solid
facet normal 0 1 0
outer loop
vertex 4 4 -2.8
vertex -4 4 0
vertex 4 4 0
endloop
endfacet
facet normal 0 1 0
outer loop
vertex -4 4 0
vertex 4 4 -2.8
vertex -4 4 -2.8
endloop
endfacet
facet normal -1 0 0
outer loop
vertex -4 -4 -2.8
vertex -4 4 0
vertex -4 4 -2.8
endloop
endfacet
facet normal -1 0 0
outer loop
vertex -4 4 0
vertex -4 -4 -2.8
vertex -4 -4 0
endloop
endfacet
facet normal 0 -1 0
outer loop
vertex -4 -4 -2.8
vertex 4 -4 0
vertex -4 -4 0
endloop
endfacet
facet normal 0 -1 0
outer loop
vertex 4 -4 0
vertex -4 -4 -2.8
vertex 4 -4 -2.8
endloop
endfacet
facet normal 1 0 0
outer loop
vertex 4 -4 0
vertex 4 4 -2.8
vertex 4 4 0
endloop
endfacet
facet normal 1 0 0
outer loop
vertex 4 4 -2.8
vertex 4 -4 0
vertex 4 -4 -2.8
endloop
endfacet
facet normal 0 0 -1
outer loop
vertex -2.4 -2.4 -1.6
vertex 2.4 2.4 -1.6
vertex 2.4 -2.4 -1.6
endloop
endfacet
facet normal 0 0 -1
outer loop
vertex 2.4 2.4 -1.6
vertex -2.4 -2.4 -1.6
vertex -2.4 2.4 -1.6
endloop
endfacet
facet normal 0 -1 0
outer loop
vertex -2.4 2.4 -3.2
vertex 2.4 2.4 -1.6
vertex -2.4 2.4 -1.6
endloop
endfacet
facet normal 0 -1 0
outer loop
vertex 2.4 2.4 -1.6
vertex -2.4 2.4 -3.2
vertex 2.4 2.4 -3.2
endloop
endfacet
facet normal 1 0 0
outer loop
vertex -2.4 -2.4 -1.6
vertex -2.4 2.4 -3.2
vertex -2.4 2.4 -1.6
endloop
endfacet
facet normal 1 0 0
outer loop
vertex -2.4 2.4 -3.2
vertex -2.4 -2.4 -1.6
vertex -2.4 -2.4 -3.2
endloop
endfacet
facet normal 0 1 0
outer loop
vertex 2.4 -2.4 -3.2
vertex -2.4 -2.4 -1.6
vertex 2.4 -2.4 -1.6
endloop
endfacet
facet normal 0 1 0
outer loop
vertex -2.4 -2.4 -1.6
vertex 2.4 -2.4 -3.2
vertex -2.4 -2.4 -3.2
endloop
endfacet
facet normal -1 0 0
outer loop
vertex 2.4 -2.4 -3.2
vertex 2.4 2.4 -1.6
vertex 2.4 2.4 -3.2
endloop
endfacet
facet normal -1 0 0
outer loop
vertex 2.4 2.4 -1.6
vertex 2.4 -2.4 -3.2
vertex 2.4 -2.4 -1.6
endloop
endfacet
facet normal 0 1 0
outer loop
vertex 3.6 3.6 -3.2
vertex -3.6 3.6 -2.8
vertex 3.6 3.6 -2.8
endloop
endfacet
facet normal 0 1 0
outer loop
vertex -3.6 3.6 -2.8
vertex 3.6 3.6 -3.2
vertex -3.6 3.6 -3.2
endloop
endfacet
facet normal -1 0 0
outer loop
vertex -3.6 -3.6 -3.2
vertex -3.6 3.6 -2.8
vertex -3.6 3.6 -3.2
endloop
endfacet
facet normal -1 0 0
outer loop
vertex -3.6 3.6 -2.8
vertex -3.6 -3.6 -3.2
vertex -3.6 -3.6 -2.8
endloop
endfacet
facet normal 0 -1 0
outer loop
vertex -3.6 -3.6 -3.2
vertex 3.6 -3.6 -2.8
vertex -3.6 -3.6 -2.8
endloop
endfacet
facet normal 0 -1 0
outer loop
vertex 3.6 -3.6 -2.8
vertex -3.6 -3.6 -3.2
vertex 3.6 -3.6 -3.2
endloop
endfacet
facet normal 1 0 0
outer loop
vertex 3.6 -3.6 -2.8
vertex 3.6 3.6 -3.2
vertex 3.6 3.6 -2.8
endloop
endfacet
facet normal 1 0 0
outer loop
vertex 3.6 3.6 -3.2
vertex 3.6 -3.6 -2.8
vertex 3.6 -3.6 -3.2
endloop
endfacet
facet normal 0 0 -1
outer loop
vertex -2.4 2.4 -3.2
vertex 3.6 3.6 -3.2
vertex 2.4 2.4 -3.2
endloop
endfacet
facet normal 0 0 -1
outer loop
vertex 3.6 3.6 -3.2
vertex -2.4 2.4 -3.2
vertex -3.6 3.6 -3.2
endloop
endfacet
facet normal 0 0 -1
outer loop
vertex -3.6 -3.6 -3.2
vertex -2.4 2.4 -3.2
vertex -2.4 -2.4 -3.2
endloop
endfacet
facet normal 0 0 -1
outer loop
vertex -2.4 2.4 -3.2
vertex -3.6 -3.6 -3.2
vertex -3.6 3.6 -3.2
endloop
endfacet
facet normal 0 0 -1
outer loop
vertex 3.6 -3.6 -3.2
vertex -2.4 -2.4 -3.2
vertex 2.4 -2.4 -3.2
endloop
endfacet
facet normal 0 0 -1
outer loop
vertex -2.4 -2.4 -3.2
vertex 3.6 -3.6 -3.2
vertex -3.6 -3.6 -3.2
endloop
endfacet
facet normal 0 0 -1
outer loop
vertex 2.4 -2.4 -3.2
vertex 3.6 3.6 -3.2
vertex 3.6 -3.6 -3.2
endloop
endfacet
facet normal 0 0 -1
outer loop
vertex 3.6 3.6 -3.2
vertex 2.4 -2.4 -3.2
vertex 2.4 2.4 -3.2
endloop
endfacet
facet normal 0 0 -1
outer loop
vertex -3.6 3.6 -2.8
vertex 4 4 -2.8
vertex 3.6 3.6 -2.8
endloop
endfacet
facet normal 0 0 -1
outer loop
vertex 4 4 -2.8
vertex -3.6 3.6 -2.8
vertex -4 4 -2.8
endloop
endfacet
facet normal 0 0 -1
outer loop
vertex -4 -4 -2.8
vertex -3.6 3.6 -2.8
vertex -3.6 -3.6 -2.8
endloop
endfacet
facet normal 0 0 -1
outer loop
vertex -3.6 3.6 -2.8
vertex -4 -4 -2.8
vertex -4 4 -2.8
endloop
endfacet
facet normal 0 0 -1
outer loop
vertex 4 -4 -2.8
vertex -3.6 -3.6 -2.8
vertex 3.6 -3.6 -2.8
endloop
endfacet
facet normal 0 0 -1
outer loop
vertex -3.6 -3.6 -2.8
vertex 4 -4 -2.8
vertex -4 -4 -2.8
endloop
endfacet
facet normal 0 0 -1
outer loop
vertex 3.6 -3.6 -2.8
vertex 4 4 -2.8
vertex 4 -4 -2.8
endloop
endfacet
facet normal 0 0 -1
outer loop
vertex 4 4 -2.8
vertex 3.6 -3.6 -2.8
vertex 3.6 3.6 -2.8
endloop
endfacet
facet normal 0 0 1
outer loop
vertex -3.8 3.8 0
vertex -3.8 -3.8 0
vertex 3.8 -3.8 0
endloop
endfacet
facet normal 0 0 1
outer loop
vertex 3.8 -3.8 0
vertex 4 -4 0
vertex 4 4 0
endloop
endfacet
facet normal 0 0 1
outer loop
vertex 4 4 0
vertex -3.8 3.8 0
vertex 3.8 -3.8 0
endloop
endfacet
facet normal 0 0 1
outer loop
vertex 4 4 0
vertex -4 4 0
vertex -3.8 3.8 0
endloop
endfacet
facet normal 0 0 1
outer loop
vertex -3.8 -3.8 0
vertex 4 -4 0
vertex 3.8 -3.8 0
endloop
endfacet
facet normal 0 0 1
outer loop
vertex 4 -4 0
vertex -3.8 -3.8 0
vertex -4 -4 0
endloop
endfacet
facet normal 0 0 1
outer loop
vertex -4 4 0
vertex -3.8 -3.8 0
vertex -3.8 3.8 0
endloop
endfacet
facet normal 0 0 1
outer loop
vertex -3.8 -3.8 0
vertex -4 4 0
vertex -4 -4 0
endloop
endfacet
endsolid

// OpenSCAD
// file: ../p/box5.scad
use <../lib.scad>
function ldraw_lib__box5() = [
// 0 Box with 5 Faces and All Edges
// 0 Name: box5.dat
// 0 Author: James Jessiman
// 0 !LDRAW_ORG Primitive UPDATE 2012-01
// 0 !LICENSE Licensed under CC BY 4.0 : see CAreadme.txt
// 
// 0 BFC CERTIFY CCW
  [0,"BFC","CERTIFY"],
  [0,"BFC","CCW"],
// 
// 0 !HISTORY 2002-04-03 [sbliss] Modified for BFC compliance
// 0 !HISTORY 2002-04-25 [PTadmin] Official Update 2002-02
// 0 !HISTORY 2007-06-24 [PTadmin] Header formatted for Contributor Agreement
// 0 !HISTORY 2008-07-01 [PTadmin] Official Update 2008-01
// 0 !HISTORY 2012-02-16 [Philo] Changed to CCW
// 0 !HISTORY 2012-03-30 [PTadmin] Official Update 2012-01
// 
// 
// 2 24 1 1 1 -1 1 1
  [2,24,1,1,1,-1,1,1],
// 2 24 -1 1 1 -1 1 -1
  [2,24,-1,1,1,-1,1,-1],
// 2 24 -1 1 -1 1 1 -1
  [2,24,-1,1,-1,1,1,-1],
// 2 24 1 1 -1 1 1 1
  [2,24,1,1,-1,1,1,1],
// 2 24 1 0 1 -1 0 1
  [2,24,1,0,1,-1,0,1],
// 2 24 -1 0 1 -1 0 -1
  [2,24,-1,0,1,-1,0,-1],
// 2 24 -1 0 -1 1 0 -1
  [2,24,-1,0,-1,1,0,-1],
// 2 24 1 0 -1 1 0 1
  [2,24,1,0,-1,1,0,1],
// 2 24 1 0 1 1 1 1
  [2,24,1,0,1,1,1,1],
// 2 24 -1 0 1 -1 1 1
  [2,24,-1,0,1,-1,1,1],
// 2 24 1 0 -1 1 1 -1
  [2,24,1,0,-1,1,1,-1],
// 2 24 -1 0 -1 -1 1 -1
  [2,24,-1,0,-1,-1,1,-1],
// 4 16 -1 1 1 1 1 1 1 1 -1 -1 1 -1
  [4,16,-1,1,1,1,1,1,1,1,-1,-1,1,-1],
// 4 16 -1 1 1 -1 0 1 1 0 1 1 1 1
  [4,16,-1,1,1,-1,0,1,1,0,1,1,1,1],
// 4 16 -1 1 -1 -1 0 -1 -1 0 1 -1 1 1
  [4,16,-1,1,-1,-1,0,-1,-1,0,1,-1,1,1],
// 4 16 1 1 -1 1 0 -1 -1 0 -1 -1 1 -1
  [4,16,1,1,-1,1,0,-1,-1,0,-1,-1,1,-1],
// 4 16 1 1 1 1 0 1 1 0 -1 1 1 -1
  [4,16,1,1,1,1,0,1,1,0,-1,1,1,-1],
];
module ldraw_lib__box5(step=0, col=false, unit=2/5, alt=false, line=0.2, solid=!$preview)
    makepoly(ldraw_lib__box5(), step=step, col=col, unit=unit, alt=alt, line=line, solid=solid);
ldraw_lib__box5(line=0.2);
// file: ../p/box4.scad
use <../lib.scad>
function ldraw_lib__box4() = [
// 0 Box with 4 Faces (2 Parallel Pairs) and All Edges
// 0 Name: box4.dat
// 0 Author: James Jessiman
// 0 !LDRAW_ORG Primitive UPDATE 2012-01
// 0 !LICENSE Licensed under CC BY 4.0 : see CAreadme.txt
// 
// 0 BFC CERTIFY CCW
  [0,"BFC","CERTIFY"],
  [0,"BFC","CCW"],
// 
// 0 !HISTORY 2002-04-03 [sbliss] Modified for BFC compliance
// 0 !HISTORY 2002-04-25 [PTadmin] Official Update 2002-02
// 0 !HISTORY 2007-06-24 [PTadmin] Header formatted for Contributor Agreement
// 0 !HISTORY 2008-07-01 [PTadmin] Official Update 2008-01
// 0 !HISTORY 2012-02-16 [Philo] Changed to CCW
// 0 !HISTORY 2012-03-30 [PTadmin] Official Update 2012-01
// 
// 
// 2 24 1 1 1 -1 1 1
  [2,24,1,1,1,-1,1,1],
// 2 24 -1 1 1 -1 1 -1
  [2,24,-1,1,1,-1,1,-1],
// 2 24 -1 1 -1 1 1 -1
  [2,24,-1,1,-1,1,1,-1],
// 2 24 1 1 -1 1 1 1
  [2,24,1,1,-1,1,1,1],
// 2 24 1 0 1 -1 0 1
  [2,24,1,0,1,-1,0,1],
// 2 24 -1 0 1 -1 0 -1
  [2,24,-1,0,1,-1,0,-1],
// 2 24 -1 0 -1 1 0 -1
  [2,24,-1,0,-1,1,0,-1],
// 2 24 1 0 -1 1 0 1
  [2,24,1,0,-1,1,0,1],
// 2 24 1 0 1 1 1 1
  [2,24,1,0,1,1,1,1],
// 2 24 -1 0 1 -1 1 1
  [2,24,-1,0,1,-1,1,1],
// 2 24 1 0 -1 1 1 -1
  [2,24,1,0,-1,1,1,-1],
// 2 24 -1 0 -1 -1 1 -1
  [2,24,-1,0,-1,-1,1,-1],
// 4 16 -1 1 1 -1 0 1 1 0 1 1 1 1
  [4,16,-1,1,1,-1,0,1,1,0,1,1,1,1],
// 4 16 -1 1 -1 -1 0 -1 -1 0 1 -1 1 1
  [4,16,-1,1,-1,-1,0,-1,-1,0,1,-1,1,1],
// 4 16 1 1 -1 1 0 -1 -1 0 -1 -1 1 -1
  [4,16,1,1,-1,1,0,-1,-1,0,-1,-1,1,-1],
// 4 16 1 1 1 1 0 1 1 0 -1 1 1 -1
  [4,16,1,1,1,1,0,1,1,0,-1,1,1,-1],
];
module ldraw_lib__box4(step=0, col=false, unit=2/5, alt=false, line=0.2, solid=!$preview)
    makepoly(ldraw_lib__box4(), step=step, col=col, unit=unit, alt=alt, line=line, solid=solid);
ldraw_lib__box4(line=0.2);
// file: s/3070bs01.scad
use <../../lib.scad>
use <../../p/box4.scad>
use <../../p/box5.scad>
function ldraw_lib__s__3070bs01() = [
// 0 ~Tile  1 x  1 with Groove without Top Face
// 0 Name: s\3070bs01.dat
// 0 Author: Chris Dee [cwdee]
// 0 !LDRAW_ORG Subpart UPDATE 2009-02
// 0 !LICENSE Licensed under CC BY 4.0 : see CAreadme.txt
// 
// 0 BFC CERTIFY CCW
  [0,"BFC","CERTIFY"],
  [0,"BFC","CCW"],
// 
// 0 !HISTORY 2009-09-03 [PTadmin] Official Update 2009-02
// 
// 
// 1 16 0 0 0 10 0 0 0 7 0 0 0 10 box4.dat
  [1,16,0,0,0,10,0,0,0,7,0,0,0,10, ldraw_lib__box4()],
// 0 BFC INVERTNEXT
  [0,"BFC","INVERTNEXT"],
// 1 16 0 8 0 6 0 0 0 -4 0 0 0 6 box5.dat
  [1,16,0,8,0,6,0,0,0,-4,0,0,0,6, ldraw_lib__box5()],
// 1 16 0 7 0 9 0 0 0 1 0 0 0 9 box4.dat
  [1,16,0,7,0,9,0,0,0,1,0,0,0,9, ldraw_lib__box4()],
// 
// 4 16 9 8 9 6 8 6 -6 8 6 -9 8 9
  [4,16,9,8,9,6,8,6,-6,8,6,-9,8,9],
// 4 16 -9 8 9 -6 8 6 -6 8 -6 -9 8 -9
  [4,16,-9,8,9,-6,8,6,-6,8,-6,-9,8,-9],
// 4 16 -9 8 -9 -6 8 -6 6 8 -6 9 8 -9
  [4,16,-9,8,-9,-6,8,-6,6,8,-6,9,8,-9],
// 4 16 9 8 -9 6 8 -6 6 8 6 9 8 9
  [4,16,9,8,-9,6,8,-6,6,8,6,9,8,9],
// 
// 4 16 10 7 10 9 7 9 -9 7 9 -10 7 10
  [4,16,10,7,10,9,7,9,-9,7,9,-10,7,10],
// 4 16 -10 7 10 -9 7 9 -9 7 -9 -10 7 -10
  [4,16,-10,7,10,-9,7,9,-9,7,-9,-10,7,-10],
// 4 16 -10 7 -10 -9 7 -9 9 7 -9 10 7 -10
  [4,16,-10,7,-10,-9,7,-9,9,7,-9,10,7,-10],
// 4 16 10 7 -10 9 7 -9 9 7 9 10 7 10
  [4,16,10,7,-10,9,7,-9,9,7,9,10,7,10],
// 0
];
module ldraw_lib__s__3070bs01(step=0, col=false, unit=2/5, alt=false, line=0.2, solid=!$preview)
    makepoly(ldraw_lib__s__3070bs01(), step=step, col=col, unit=unit, alt=alt, line=line, solid=solid);
ldraw_lib__s__3070bs01(line=0.2);
// main file
use <../lib.scad>
use <s/3070bs01.scad>
function ldraw_lib__3070bpy2() = [
// 0 Tile  1 x  1 with Blue Triangle Pattern
// 0 Name: 3070bpy2.dat
// 0 Author: Peter Grass [Evilspyre]
// 0 !LDRAW_ORG Part UPDATE 2026-01
// 0 !LICENSE Licensed under CC BY 4.0 : see CAreadme.txt
// 
// 0 BFC CERTIFY CCW
  [0,"BFC","CERTIFY"],
  [0,"BFC","CCW"],
// 
// 0 !KEYWORDS BrickLink 3070pb375, Brickowl 539564, Brickset 112604, Icons
// 0 !KEYWORDS Rebrickable 3070bpr9896, set 10353, Williams Racing FW14B
// 
// 0 !HISTORY 2025-07-27 [OrionP] Official Update 2025-07
// 0 !HISTORY 2025-12-23 [MagFors] Update description
// 0 !HISTORY 2025-12-25 [OrionP] Official Update 2025-12
// 0 !HISTORY 2026-01-29 [OrionP] Minor header edits
// 0 !HISTORY 2026-01-29 [OrionP] Official Update 2026-01
// 
// 1 16 0 0 0 1 0 0 0 1 0 0 0 1 s\3070bs01.dat
  [1,16,0,0,0,1,0,0,0,1,0,0,0,1, ldraw_lib__s__3070bs01()],
// 3 1 -9.5 0 9.5 -9.5 0 -9.5 9.5 0 -9.5
  [3,1,-9.5,0,9.5,-9.5,0,-9.5,9.5,0,-9.5],
// 3 16 9.5 0 -9.5 10 0 -10 10 0 10
  [3,16,9.5,0,-9.5,10,0,-10,10,0,10],
// 3 16 10 0 10 -9.5 0 9.5 9.5 0 -9.5
  [3,16,10,0,10,-9.5,0,9.5,9.5,0,-9.5],
// 3 16 10 0 10 -10 0 10 -9.5 0 9.5
  [3,16,10,0,10,-10,0,10,-9.5,0,9.5],
// 4 16 10 0 -10 9.5 0 -9.5 -9.5 0 -9.5 -10 0 -10
  [4,16,10,0,-10,9.5,0,-9.5,-9.5,0,-9.5,-10,0,-10],
// 4 16 -10 0 -10 -9.5 0 -9.5 -9.5 0 9.5 -10 0 10
  [4,16,-10,0,-10,-9.5,0,-9.5,-9.5,0,9.5,-10,0,10],
];
module ldraw_lib__3070bpy2(step=0, col=false, unit=2/5, alt=false, line=0.2, solid=!$preview)
    makepoly(ldraw_lib__3070bpy2(), step=step, col=col, unit=unit, alt=alt, line=line, solid=solid);
ldraw_lib__3070bpy2(line=0.2);
